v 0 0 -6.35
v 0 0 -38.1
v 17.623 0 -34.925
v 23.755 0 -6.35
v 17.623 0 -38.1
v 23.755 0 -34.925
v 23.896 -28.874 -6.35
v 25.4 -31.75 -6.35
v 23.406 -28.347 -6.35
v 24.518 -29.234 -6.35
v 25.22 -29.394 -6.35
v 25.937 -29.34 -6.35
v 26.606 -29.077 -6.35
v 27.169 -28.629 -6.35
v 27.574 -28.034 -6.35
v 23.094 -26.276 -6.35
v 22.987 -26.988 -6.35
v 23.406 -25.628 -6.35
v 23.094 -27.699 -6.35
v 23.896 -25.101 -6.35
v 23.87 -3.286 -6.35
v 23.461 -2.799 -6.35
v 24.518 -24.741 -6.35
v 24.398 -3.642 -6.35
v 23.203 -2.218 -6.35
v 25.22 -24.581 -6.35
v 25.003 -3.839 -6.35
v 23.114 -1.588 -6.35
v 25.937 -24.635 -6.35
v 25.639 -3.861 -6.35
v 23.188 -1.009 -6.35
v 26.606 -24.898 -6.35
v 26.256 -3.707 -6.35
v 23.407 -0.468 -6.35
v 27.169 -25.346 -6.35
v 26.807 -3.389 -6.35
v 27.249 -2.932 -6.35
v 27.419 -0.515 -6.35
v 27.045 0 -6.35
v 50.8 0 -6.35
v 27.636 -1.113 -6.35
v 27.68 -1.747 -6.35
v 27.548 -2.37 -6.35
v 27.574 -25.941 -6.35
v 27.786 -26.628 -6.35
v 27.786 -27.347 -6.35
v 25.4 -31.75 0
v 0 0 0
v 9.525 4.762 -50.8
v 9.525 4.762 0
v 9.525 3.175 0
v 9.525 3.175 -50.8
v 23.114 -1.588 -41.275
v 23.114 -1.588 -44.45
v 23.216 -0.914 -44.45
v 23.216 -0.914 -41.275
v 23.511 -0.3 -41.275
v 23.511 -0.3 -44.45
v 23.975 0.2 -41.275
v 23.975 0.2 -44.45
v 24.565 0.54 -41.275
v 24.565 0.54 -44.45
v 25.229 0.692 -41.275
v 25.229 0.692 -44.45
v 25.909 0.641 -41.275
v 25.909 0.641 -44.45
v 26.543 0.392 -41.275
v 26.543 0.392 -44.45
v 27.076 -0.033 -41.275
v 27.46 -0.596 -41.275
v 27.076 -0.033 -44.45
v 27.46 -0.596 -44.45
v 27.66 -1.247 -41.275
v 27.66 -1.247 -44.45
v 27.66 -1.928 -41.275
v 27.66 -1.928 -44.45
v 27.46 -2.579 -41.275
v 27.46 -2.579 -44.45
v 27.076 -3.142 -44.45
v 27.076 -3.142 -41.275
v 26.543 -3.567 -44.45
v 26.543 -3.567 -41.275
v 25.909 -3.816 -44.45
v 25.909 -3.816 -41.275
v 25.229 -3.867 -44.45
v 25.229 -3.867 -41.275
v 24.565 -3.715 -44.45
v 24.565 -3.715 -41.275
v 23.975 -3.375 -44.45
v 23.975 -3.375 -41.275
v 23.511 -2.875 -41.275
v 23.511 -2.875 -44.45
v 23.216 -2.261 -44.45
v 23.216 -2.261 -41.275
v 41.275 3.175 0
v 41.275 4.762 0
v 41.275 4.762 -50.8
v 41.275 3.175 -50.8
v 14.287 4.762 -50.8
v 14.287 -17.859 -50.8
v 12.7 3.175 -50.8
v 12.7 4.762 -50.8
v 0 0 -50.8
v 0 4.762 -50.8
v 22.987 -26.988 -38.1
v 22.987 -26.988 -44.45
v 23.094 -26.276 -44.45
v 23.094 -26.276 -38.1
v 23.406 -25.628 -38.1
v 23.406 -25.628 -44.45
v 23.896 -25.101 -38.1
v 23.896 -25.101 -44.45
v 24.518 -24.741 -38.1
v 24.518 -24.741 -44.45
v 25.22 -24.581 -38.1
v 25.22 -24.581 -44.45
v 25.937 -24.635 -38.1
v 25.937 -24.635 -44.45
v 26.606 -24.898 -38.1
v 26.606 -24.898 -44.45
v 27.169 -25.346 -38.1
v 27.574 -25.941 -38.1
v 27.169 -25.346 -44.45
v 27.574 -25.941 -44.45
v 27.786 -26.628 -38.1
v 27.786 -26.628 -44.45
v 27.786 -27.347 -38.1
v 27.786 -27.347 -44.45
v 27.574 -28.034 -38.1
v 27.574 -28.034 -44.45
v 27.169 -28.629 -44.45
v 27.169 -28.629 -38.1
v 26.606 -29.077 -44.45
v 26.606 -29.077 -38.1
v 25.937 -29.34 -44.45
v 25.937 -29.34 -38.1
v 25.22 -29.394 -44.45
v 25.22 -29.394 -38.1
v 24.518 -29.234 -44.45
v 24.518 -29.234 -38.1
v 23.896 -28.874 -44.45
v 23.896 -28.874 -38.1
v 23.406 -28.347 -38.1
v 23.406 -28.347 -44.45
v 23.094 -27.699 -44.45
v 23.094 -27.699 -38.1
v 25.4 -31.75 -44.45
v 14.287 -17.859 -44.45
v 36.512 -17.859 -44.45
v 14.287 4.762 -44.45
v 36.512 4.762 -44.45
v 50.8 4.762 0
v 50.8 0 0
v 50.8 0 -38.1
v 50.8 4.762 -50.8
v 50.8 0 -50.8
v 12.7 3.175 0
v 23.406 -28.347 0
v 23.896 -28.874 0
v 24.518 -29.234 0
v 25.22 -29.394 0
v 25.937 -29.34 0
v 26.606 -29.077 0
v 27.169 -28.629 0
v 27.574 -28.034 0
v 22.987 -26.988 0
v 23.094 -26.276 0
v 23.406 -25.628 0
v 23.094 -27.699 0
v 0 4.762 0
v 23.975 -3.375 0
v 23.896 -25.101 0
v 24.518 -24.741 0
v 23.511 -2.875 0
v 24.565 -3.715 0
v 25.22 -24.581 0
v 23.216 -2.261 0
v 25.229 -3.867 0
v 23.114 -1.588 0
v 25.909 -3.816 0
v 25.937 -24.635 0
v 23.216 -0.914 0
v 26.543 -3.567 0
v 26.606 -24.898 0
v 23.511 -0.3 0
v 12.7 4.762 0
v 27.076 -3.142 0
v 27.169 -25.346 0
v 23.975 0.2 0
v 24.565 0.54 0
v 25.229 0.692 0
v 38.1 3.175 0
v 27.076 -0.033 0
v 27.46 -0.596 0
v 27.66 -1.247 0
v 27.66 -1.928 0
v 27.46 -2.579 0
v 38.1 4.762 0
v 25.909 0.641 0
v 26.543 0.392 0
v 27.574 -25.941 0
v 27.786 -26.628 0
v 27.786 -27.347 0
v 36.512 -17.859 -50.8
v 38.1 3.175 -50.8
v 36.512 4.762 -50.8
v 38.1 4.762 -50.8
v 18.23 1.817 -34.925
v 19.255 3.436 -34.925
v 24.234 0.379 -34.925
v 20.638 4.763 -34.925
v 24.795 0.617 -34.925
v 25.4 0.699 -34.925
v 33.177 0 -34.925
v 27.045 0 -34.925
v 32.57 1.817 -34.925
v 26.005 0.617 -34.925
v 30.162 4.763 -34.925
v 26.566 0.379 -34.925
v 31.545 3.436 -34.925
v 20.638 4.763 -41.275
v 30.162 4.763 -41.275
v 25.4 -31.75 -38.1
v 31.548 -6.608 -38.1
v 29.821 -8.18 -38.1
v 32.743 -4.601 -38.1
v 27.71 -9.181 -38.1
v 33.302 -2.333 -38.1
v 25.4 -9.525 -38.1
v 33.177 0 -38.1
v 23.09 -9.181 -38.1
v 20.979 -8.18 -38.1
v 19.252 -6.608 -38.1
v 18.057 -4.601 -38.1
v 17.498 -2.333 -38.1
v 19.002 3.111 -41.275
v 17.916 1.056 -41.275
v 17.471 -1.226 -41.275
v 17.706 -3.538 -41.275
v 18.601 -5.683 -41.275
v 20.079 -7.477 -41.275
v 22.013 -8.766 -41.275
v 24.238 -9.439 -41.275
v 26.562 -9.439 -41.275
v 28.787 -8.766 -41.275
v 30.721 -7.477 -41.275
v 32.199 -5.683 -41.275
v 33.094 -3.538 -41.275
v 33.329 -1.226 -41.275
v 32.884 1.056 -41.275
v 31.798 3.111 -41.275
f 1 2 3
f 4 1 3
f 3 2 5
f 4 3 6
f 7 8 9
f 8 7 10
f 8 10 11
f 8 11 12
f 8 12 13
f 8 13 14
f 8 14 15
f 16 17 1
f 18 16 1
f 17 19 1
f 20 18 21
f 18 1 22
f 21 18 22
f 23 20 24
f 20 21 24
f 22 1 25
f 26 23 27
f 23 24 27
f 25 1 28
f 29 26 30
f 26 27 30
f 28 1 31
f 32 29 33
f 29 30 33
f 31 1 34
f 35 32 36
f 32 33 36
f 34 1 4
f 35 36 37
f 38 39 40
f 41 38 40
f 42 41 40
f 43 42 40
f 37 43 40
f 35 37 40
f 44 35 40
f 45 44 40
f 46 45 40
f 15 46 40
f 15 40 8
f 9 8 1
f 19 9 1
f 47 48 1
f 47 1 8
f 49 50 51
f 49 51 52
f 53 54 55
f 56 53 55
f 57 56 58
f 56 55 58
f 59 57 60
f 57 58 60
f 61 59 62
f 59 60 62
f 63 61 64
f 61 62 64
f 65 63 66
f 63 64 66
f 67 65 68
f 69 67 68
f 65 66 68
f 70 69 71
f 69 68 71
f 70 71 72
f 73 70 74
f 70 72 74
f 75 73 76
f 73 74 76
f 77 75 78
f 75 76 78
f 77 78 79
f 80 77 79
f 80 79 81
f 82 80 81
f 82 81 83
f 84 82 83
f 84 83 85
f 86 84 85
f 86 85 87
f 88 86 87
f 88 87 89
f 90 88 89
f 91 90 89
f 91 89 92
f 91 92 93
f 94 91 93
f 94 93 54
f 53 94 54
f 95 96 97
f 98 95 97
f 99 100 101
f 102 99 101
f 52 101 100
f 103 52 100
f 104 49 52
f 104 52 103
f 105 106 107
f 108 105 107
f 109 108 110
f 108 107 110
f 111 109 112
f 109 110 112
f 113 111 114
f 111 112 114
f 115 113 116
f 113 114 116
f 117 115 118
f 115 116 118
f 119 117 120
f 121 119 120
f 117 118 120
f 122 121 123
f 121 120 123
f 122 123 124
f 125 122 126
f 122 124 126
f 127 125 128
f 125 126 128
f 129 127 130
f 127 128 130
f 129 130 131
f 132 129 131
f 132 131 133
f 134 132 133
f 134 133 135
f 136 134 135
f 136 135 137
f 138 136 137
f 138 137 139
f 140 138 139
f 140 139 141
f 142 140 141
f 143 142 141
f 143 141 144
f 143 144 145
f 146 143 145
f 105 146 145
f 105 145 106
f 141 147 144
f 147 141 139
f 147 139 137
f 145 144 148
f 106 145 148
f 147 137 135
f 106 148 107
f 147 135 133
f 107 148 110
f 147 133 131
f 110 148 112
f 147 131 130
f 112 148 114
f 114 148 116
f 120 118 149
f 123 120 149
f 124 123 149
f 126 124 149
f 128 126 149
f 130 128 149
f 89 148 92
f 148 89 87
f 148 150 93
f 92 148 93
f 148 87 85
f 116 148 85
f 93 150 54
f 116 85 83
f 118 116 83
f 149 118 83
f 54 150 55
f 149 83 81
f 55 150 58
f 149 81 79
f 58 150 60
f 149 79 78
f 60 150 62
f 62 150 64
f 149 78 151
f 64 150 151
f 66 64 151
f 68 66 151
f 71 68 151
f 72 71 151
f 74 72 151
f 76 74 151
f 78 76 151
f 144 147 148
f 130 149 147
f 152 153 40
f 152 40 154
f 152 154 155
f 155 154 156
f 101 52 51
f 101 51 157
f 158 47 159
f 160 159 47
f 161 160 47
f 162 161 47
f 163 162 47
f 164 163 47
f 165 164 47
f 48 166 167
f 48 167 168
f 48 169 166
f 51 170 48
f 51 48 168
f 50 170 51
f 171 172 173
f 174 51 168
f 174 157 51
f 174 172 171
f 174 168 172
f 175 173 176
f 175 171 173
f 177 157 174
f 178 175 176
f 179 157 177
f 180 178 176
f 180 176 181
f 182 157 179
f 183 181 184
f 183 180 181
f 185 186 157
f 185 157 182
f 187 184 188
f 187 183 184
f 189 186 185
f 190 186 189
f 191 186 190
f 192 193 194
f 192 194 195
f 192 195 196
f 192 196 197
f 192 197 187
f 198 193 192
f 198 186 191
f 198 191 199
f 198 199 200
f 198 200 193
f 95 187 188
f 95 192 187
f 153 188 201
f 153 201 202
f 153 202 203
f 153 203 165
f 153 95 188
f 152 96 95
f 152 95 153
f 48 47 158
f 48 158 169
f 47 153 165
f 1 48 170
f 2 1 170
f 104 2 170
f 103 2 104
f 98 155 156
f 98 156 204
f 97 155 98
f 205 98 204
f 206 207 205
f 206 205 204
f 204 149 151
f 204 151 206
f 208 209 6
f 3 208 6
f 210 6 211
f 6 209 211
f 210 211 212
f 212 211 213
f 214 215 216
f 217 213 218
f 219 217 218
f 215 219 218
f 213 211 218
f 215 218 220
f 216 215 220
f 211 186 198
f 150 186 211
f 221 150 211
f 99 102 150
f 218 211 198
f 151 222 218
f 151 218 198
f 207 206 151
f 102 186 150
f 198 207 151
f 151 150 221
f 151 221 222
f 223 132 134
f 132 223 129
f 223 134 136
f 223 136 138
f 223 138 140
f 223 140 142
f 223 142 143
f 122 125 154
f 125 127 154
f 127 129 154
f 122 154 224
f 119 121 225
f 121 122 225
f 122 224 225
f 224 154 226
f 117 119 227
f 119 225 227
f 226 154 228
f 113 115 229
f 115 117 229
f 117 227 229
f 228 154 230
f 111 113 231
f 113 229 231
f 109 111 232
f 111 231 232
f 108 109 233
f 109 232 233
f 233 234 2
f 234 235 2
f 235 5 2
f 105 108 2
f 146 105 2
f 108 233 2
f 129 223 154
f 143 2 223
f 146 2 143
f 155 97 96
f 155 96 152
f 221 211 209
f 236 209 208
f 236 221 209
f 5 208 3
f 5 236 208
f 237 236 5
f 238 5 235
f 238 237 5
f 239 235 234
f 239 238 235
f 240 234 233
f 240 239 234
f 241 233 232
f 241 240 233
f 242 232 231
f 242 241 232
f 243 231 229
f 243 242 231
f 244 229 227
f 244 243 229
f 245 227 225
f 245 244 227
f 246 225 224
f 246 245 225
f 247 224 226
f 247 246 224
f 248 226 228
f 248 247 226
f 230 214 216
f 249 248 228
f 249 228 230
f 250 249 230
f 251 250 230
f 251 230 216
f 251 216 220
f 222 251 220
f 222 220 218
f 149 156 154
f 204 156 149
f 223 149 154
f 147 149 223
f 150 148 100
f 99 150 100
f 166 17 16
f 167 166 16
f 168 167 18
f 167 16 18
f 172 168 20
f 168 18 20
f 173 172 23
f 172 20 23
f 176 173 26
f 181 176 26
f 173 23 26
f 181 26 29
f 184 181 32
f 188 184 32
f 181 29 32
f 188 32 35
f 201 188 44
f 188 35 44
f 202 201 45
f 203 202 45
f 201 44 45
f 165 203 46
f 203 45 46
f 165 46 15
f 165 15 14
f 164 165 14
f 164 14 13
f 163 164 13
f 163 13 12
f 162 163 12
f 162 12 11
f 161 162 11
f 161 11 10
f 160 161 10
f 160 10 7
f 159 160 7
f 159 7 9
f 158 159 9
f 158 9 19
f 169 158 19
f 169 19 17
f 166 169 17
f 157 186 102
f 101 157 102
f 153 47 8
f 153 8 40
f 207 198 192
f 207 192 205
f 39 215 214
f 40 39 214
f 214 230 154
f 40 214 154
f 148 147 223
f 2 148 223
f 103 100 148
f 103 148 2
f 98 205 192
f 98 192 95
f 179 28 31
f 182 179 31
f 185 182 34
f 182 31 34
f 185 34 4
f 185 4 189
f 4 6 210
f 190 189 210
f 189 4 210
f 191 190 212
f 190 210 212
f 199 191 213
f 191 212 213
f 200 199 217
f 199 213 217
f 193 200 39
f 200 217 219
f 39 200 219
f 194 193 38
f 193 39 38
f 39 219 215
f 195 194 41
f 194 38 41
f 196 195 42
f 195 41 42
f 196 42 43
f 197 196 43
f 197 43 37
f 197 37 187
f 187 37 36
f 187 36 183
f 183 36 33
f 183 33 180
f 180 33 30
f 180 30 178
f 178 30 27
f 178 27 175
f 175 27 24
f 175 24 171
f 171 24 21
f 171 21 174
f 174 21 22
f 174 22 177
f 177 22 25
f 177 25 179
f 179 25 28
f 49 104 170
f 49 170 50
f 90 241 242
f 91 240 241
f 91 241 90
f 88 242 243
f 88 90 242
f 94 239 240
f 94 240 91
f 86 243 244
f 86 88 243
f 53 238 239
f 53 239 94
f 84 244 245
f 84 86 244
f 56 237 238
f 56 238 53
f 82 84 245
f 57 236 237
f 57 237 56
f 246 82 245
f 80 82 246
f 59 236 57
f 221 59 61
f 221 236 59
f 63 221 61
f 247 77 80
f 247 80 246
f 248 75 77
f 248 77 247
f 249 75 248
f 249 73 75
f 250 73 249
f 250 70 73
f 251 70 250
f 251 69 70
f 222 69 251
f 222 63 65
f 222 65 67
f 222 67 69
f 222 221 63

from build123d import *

# Parameters (mm, degrees)
SKETCH2_W               = 50.8
SKETCH2_H               = 50.8
BOSS_EXTRUDE1_DEPTH     = 4.7625
SKETCH3_W               = 3.175
SKETCH3_H               = 50.8
CUT_EXTRUDE1_DEPTH      = 1.5875
BOSS_EXTRUDE2_DEPTH     = 6.35
BOSS_EXTRUDE3_DEPTH     = 12.7
SKETCH6_W               = 22.225
SKETCH6_H               = 6.35
CUT_EXTRUDE2_DEPTH      = 44.45
SKETCH7_R               = 2.413
SKETCH7_R_2             = 2.286
CUT_EXTRUDE3_DEPTH      = 50.8
CUT_EXTRUDE4_DEPTH      = 3.175
CUT_EXTRUDE4_DEPTH_BACK = 3.175
SKETCH8_R               = 7.9375


with BuildPart() as part:
    # Sketch2 → Boss-Extrude1 (new body)
    with BuildSketch(Plane(origin=(0, 0, 0), x_dir=(1, 0, 0), z_dir=(0, 1, 0))):
        with Locations((25.4, 25.4)):
            Rectangle(SKETCH2_W, SKETCH2_H)
    extrude(amount=BOSS_EXTRUDE1_DEPTH)

    # Sketch3 → Cut-Extrude1 (cut)
    with BuildSketch(Plane(origin=(0, 4.7625, 0), x_dir=(1, 0, 0), z_dir=(0, 1, 0))):
        with Locations((11.1125, 25.4)):
            Rectangle(SKETCH3_W, SKETCH3_H)
        with Locations((39.6875, 25.4)):
            Rectangle(SKETCH3_W, SKETCH3_H)
    extrude(amount=-CUT_EXTRUDE1_DEPTH, mode=Mode.SUBTRACT)

    # Sketch4 → Boss-Extrude2 (add)
    with BuildSketch(Plane.XY):
        Polygon((50.8, 0), (25.4, 0), (25.4, -31.75), align=None)
        Polygon((25.4, 0), (0, 0), (25.4, -31.75), align=None)
    extrude(amount=-BOSS_EXTRUDE2_DEPTH)

    # Sketch5 → Boss-Extrude3 (add)
    with BuildSketch(Plane(origin=(0, 0, -50.8), x_dir=(-1, 0, 0), z_dir=(0, 0, -1))):
        Polygon((-25.4, 0), (-50.8, 0), (-25.4, -31.75), align=None)
        Polygon((0, 0), (-25.4, 0), (-25.4, -31.75), align=None)
    extrude(amount=-BOSS_EXTRUDE3_DEPTH)

    # Sketch6 → Cut-Extrude2 (cut)
    with BuildSketch(Plane(origin=(0, 4.7625, 0), x_dir=(1, 0, 0), z_dir=(0, 1, 0))):
        with Locations((25.4, 47.625)):
            Rectangle(SKETCH6_W, SKETCH6_H)
    extrude(amount=-CUT_EXTRUDE2_DEPTH, mode=Mode.SUBTRACT)

    # Sketch7 → Cut-Extrude3 (cut)
    with BuildSketch(Plane(origin=(0, 0, -44.45), x_dir=(-1, 0, 0), z_dir=(0, 0, -1))):
        with Locations((-25.4, -26.9875)):
            Circle(SKETCH7_R)
        with Locations((-25.4, -1.5875)):
            Circle(SKETCH7_R_2)
    extrude(amount=-CUT_EXTRUDE3_DEPTH, mode=Mode.SUBTRACT)

    # Sketch8 → Cut-Extrude4 (cut, two sides: drawn at the far end of the back side and taken through both)
    with BuildSketch(Plane.XY.offset(-38.1).offset(-CUT_EXTRUDE4_DEPTH_BACK)):
        with Locations((25.4, -1.5875)):
            Circle(SKETCH8_R)
    extrude(amount=CUT_EXTRUDE4_DEPTH + CUT_EXTRUDE4_DEPTH_BACK, mode=Mode.SUBTRACT)


solid = part.part
